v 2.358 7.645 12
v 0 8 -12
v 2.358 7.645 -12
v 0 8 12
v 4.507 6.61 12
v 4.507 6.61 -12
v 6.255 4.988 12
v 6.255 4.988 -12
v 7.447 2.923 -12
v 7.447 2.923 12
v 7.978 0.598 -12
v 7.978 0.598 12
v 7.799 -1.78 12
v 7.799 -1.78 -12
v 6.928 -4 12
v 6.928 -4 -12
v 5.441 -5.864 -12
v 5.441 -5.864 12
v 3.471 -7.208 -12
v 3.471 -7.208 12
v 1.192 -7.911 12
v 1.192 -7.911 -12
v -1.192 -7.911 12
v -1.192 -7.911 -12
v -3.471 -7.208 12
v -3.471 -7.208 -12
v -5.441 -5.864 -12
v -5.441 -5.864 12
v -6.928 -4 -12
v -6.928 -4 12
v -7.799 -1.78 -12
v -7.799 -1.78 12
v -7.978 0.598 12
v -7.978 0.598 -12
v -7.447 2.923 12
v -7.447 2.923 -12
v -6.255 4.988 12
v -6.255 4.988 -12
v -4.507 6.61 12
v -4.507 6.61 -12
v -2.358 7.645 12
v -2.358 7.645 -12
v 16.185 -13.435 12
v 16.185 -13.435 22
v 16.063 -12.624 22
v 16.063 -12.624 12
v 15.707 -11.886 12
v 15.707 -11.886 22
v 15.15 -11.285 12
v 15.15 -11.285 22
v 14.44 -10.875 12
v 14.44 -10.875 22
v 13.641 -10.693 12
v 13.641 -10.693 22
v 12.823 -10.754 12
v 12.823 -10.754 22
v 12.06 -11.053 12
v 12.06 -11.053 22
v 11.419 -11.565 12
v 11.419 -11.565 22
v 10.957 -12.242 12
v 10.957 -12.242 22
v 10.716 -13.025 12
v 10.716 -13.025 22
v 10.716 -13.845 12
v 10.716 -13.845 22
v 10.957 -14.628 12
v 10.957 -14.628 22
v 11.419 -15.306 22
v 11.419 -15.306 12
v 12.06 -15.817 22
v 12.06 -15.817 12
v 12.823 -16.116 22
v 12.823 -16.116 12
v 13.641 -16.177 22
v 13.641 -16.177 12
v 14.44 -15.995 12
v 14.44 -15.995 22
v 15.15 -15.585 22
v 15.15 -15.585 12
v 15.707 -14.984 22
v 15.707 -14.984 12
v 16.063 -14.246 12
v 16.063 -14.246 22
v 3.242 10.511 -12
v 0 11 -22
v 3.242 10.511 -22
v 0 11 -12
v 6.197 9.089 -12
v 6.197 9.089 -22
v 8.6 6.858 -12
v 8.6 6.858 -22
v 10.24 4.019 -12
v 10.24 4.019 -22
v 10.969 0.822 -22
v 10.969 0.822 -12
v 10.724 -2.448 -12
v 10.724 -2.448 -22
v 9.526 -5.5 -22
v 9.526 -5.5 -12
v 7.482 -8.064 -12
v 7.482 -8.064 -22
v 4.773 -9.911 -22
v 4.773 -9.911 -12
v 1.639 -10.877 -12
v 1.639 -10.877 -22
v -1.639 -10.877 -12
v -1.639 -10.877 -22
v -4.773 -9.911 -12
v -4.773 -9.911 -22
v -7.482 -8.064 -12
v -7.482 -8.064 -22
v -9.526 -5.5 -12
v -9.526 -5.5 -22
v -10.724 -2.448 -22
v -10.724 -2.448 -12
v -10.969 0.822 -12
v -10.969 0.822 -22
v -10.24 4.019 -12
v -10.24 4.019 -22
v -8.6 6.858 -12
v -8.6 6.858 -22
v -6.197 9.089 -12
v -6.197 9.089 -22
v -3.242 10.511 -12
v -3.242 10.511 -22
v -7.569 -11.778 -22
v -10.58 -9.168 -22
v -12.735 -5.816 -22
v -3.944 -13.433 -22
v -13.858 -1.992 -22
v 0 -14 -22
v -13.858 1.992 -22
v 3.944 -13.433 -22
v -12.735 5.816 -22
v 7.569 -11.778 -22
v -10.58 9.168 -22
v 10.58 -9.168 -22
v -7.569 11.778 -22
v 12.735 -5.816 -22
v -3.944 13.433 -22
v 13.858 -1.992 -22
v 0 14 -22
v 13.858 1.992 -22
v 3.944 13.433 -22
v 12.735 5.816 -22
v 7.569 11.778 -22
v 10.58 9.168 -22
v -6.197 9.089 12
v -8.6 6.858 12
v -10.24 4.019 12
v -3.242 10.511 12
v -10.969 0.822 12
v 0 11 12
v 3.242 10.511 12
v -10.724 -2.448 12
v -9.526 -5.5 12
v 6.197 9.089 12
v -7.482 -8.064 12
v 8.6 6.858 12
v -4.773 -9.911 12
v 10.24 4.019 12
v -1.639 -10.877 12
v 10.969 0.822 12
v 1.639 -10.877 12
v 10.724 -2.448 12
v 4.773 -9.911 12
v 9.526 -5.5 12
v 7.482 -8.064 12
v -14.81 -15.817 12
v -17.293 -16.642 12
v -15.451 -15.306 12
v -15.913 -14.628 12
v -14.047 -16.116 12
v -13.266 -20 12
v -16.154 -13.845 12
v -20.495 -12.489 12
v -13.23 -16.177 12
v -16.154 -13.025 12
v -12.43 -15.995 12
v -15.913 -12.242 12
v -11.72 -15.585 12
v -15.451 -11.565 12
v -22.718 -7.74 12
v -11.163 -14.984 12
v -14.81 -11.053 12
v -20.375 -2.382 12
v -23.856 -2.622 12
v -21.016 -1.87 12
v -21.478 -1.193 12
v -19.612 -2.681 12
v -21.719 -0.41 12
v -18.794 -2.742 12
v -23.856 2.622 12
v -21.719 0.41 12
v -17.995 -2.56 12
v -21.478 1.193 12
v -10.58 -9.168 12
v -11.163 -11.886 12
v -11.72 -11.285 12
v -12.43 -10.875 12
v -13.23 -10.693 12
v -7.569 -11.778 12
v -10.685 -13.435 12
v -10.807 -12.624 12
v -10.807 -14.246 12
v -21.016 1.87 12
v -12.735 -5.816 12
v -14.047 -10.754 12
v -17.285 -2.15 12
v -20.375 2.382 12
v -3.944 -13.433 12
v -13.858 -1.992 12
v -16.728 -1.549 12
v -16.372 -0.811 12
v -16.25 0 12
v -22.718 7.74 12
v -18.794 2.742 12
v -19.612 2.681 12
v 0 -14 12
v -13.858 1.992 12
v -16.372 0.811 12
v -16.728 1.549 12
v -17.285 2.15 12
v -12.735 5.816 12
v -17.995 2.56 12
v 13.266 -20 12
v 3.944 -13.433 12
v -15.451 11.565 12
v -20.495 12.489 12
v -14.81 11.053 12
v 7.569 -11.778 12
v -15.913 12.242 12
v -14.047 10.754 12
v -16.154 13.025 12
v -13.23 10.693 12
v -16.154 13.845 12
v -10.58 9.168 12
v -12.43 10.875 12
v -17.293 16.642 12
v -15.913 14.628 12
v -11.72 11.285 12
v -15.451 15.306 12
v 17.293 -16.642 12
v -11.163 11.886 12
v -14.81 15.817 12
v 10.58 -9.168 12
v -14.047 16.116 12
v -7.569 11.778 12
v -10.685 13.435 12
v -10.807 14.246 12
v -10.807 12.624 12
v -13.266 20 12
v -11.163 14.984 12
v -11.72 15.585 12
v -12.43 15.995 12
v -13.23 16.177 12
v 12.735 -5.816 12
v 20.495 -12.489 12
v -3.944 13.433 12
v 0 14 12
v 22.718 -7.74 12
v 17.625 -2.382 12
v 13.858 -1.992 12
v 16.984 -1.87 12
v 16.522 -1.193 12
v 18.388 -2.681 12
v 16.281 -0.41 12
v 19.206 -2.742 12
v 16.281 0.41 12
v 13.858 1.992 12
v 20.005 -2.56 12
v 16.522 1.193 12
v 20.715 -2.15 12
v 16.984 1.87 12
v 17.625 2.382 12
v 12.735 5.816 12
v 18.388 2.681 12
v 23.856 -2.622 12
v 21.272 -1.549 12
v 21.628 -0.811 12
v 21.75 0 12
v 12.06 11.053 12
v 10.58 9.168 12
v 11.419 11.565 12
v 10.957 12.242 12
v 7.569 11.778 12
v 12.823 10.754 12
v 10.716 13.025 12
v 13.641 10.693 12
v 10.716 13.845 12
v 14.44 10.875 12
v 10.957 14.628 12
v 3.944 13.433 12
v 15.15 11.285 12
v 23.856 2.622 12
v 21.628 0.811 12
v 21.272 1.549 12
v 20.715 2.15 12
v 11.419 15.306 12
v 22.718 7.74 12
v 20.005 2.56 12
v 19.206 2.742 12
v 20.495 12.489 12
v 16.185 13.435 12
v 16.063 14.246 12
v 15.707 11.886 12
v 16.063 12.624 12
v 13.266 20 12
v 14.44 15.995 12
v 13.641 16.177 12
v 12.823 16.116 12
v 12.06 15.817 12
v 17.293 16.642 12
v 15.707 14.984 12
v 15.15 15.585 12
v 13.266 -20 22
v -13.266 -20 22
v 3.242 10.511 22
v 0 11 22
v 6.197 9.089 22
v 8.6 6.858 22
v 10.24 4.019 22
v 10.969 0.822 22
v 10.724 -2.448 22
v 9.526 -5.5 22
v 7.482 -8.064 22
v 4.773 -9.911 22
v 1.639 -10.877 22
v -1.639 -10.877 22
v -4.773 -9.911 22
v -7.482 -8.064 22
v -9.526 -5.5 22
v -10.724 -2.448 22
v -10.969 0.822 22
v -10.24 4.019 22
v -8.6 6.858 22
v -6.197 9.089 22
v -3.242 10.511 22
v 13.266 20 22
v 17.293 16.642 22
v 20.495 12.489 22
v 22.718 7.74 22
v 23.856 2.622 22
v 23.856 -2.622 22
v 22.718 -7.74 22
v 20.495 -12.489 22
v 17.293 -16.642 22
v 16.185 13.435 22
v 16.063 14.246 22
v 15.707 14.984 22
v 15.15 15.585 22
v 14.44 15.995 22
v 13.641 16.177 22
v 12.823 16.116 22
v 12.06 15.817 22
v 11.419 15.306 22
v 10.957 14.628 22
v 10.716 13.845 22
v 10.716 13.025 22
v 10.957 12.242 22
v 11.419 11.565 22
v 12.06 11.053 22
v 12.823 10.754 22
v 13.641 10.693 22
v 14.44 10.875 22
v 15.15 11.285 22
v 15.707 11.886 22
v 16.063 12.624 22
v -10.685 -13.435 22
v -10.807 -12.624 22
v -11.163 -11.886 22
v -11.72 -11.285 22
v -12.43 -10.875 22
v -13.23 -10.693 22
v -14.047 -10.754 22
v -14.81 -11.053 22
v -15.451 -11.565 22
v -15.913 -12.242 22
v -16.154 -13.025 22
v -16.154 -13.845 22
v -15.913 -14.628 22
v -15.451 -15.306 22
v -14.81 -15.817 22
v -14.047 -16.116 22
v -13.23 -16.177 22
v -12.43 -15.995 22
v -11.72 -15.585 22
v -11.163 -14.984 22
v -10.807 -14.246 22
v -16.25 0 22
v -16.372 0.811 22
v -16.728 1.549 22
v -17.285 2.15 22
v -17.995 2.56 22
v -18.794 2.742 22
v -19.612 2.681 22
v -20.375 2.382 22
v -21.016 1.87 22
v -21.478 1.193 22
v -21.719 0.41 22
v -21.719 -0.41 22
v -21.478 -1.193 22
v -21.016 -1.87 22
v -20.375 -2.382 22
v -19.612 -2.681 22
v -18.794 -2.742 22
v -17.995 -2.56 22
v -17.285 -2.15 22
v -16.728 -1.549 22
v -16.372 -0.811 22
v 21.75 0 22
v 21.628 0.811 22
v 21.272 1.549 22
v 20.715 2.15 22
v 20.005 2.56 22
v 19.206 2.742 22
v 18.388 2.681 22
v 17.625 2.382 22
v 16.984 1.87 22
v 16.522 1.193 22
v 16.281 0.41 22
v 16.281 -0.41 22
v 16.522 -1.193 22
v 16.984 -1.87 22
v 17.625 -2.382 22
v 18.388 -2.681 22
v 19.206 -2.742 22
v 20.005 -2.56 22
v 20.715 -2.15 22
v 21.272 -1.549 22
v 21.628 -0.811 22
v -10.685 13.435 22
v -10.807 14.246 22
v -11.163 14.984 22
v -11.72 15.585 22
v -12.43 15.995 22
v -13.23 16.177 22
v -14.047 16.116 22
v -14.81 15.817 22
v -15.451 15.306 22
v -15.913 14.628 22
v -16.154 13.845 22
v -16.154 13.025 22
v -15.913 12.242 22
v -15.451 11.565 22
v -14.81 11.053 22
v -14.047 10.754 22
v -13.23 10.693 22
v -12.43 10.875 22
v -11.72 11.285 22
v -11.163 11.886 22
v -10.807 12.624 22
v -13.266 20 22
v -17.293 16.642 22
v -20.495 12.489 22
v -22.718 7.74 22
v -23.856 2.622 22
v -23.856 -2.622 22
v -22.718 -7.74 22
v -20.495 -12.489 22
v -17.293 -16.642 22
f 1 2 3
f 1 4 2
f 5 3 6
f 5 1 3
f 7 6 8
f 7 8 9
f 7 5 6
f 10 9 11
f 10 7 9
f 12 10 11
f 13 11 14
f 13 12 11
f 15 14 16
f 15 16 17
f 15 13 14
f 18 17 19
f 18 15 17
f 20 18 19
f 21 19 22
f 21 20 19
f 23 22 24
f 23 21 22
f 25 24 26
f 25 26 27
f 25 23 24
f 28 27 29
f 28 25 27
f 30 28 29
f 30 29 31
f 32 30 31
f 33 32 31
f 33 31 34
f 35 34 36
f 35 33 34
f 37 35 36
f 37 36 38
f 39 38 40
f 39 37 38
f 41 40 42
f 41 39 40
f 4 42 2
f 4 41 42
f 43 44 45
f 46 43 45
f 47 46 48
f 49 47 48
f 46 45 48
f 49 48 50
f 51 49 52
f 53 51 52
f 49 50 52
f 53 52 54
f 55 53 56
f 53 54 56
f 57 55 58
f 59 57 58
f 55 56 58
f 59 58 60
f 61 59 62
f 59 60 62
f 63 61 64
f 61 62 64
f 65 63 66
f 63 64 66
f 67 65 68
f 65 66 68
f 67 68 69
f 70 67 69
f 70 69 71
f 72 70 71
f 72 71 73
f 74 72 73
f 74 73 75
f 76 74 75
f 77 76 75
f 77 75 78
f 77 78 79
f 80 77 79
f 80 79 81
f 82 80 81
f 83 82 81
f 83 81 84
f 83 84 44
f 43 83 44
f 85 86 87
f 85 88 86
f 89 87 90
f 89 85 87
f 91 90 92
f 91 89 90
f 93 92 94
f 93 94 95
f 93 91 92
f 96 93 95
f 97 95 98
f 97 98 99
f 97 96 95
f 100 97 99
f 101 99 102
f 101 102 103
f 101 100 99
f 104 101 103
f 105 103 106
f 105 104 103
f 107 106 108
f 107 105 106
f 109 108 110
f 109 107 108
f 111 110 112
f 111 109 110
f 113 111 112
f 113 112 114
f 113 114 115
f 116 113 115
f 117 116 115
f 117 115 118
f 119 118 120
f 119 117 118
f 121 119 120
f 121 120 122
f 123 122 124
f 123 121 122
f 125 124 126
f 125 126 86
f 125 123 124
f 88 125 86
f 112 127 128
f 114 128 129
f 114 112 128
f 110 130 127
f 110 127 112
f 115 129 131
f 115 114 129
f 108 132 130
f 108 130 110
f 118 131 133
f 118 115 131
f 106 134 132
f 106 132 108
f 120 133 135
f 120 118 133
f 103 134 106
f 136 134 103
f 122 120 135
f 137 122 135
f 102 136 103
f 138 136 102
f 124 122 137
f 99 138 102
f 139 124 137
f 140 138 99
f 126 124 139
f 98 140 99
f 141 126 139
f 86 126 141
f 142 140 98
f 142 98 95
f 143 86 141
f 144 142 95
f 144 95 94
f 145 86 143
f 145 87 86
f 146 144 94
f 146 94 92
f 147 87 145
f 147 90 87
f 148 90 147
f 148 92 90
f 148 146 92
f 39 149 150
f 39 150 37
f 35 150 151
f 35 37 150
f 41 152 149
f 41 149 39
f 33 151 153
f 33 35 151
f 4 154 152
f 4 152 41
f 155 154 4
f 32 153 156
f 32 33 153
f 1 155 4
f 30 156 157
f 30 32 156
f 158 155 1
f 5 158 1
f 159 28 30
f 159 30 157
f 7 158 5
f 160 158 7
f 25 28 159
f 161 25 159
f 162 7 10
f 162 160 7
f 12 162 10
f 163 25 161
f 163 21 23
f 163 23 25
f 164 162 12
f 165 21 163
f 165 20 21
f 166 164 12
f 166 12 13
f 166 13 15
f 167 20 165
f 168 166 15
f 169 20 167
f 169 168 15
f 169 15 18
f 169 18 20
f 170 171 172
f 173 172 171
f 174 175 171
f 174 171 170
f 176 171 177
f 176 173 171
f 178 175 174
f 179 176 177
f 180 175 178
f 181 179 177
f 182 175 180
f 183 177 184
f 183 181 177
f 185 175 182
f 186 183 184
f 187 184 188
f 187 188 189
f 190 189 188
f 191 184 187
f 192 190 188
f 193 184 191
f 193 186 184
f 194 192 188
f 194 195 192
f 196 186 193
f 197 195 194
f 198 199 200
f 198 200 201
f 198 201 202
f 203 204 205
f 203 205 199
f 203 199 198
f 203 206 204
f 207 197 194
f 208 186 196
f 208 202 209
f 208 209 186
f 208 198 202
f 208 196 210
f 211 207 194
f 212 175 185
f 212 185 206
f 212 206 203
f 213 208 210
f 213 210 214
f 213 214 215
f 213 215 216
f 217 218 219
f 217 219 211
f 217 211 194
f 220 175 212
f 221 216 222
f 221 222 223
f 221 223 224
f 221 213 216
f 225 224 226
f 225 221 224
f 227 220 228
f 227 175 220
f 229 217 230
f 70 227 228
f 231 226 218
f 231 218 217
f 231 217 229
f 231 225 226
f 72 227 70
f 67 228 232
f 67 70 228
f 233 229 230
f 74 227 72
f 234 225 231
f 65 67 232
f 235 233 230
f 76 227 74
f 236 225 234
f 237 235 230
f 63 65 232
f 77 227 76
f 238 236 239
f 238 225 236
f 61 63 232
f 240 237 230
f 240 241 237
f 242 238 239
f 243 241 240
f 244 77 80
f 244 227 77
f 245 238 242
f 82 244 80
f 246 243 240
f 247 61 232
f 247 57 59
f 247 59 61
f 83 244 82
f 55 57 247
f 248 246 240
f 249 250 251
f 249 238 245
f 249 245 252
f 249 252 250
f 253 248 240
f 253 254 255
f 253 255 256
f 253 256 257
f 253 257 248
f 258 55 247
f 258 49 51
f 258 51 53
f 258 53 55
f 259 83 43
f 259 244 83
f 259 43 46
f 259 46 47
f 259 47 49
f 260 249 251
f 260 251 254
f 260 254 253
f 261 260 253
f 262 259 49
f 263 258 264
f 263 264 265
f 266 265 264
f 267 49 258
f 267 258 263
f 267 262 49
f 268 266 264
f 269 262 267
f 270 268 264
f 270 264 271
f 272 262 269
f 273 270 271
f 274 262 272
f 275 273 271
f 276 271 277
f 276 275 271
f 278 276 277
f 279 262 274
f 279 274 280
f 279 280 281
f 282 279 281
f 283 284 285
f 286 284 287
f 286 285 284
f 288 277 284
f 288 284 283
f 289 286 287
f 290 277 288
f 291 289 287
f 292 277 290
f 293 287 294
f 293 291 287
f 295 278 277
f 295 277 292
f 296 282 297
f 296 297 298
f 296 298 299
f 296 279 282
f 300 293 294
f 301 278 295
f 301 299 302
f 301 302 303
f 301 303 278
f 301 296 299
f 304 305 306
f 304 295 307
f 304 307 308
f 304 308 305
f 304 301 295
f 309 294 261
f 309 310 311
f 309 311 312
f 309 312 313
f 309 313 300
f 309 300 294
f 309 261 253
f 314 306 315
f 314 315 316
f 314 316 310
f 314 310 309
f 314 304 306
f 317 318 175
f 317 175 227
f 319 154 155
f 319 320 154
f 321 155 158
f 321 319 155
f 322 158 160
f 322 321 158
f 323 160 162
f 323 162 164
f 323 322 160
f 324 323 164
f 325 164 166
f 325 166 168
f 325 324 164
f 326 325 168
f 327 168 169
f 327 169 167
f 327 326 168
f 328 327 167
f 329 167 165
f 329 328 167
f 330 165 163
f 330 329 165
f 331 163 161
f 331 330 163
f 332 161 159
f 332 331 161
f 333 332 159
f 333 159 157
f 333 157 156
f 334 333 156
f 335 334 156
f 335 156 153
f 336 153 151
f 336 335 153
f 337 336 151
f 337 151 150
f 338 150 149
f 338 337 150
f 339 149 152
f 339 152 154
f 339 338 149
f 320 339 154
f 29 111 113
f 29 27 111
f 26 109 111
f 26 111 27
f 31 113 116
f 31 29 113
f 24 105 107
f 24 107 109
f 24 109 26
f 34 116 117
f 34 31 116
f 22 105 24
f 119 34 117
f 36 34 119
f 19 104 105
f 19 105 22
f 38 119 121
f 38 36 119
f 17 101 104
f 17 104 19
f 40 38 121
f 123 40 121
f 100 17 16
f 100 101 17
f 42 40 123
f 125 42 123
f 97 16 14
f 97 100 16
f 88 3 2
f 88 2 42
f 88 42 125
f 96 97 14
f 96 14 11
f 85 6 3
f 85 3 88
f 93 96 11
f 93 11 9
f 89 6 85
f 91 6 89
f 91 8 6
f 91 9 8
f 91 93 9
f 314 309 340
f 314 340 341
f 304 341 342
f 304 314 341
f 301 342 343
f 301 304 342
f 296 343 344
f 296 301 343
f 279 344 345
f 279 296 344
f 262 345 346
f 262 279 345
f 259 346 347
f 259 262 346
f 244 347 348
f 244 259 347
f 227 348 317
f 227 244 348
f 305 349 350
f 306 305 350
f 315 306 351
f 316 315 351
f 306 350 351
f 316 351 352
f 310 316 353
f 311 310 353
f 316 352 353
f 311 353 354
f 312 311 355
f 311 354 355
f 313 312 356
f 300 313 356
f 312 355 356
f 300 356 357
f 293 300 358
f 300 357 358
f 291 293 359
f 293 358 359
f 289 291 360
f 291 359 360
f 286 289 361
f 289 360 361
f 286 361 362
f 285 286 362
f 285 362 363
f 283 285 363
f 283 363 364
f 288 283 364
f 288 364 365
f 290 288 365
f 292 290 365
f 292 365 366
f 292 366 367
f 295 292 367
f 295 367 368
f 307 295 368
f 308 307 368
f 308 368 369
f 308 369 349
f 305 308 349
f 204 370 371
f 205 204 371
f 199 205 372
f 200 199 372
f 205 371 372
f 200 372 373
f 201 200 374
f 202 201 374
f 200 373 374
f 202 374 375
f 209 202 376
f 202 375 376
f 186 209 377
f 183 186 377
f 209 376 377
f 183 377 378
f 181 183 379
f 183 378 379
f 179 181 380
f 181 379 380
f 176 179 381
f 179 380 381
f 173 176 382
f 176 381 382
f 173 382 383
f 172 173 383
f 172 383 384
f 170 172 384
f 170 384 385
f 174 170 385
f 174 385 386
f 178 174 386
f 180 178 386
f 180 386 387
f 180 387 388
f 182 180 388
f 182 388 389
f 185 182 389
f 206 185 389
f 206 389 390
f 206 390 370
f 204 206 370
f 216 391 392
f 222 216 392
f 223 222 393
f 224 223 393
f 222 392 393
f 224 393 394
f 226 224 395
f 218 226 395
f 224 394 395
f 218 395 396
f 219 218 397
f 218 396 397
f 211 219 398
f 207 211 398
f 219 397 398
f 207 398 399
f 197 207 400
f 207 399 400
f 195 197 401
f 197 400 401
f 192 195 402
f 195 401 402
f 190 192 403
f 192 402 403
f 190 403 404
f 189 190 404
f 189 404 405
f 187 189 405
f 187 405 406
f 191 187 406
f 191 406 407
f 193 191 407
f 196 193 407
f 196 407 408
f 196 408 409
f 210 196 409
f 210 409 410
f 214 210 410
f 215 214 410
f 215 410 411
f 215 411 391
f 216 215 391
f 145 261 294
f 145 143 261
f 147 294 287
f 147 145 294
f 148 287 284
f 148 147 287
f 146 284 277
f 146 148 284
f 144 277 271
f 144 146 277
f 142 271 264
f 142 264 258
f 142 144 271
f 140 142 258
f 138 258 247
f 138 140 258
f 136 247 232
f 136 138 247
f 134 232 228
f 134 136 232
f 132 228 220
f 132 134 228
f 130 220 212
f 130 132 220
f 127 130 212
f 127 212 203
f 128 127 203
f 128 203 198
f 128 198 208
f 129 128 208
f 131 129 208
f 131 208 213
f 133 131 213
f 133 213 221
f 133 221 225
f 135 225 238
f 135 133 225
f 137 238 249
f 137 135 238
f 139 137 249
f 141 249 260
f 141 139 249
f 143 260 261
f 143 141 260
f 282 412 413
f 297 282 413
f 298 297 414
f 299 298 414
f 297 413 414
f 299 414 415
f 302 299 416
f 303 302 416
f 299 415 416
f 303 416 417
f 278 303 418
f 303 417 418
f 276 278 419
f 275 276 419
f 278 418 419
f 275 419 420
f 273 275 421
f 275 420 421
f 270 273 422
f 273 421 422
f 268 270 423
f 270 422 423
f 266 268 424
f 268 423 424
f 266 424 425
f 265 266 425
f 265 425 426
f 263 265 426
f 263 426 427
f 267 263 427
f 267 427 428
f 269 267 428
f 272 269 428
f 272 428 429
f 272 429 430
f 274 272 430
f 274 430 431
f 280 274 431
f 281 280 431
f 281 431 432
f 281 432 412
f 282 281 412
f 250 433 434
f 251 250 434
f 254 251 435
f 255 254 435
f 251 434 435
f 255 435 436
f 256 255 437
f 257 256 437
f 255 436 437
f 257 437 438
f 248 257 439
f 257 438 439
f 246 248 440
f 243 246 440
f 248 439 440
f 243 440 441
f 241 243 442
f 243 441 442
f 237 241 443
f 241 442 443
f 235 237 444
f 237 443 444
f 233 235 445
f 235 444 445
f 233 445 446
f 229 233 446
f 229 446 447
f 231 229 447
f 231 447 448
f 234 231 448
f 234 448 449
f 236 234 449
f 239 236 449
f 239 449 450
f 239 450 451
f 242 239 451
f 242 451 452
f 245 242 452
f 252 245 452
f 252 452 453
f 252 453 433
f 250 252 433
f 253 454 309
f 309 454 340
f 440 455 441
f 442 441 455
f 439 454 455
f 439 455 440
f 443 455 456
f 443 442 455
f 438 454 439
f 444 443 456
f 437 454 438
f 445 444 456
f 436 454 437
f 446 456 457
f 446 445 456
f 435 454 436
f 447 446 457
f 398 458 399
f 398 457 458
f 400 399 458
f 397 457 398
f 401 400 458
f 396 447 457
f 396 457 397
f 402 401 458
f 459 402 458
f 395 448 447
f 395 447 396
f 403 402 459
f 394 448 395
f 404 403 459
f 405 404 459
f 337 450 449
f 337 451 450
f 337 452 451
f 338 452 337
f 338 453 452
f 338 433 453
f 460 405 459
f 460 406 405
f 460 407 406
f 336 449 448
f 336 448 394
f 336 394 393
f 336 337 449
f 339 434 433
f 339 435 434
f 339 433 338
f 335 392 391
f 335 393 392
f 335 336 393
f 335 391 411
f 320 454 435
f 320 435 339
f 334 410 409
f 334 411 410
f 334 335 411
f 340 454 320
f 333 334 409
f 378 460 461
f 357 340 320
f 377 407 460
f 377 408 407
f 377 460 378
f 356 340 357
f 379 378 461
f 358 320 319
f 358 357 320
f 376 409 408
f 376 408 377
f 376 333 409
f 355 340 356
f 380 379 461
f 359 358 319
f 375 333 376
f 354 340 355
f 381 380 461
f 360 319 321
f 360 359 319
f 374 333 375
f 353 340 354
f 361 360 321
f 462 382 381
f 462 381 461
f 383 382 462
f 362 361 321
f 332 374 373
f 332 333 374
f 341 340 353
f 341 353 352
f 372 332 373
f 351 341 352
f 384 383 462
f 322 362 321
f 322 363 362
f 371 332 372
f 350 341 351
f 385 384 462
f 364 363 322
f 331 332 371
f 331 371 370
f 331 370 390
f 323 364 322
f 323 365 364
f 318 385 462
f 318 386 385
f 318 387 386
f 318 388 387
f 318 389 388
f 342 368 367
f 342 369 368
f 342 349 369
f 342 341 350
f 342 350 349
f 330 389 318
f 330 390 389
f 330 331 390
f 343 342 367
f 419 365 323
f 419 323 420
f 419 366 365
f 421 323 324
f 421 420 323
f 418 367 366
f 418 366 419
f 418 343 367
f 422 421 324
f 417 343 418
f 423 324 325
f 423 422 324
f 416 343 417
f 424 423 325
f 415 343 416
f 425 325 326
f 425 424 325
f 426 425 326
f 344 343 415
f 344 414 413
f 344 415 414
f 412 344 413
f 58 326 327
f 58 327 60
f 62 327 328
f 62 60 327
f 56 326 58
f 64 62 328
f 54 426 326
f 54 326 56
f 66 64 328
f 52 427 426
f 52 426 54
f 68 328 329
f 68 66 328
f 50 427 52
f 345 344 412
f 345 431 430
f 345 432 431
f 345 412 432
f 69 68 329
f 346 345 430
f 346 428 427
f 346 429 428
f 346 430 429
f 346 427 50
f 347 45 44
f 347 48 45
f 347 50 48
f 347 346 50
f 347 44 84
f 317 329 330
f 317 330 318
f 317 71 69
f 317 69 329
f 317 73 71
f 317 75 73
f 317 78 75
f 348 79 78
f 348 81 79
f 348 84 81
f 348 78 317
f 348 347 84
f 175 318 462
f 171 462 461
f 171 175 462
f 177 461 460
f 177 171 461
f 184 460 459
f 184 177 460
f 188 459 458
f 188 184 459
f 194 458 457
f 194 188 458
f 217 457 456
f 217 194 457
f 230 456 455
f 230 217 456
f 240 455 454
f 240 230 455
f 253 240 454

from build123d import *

# Parameters (mm, degrees)
SKETCH5_W          = 40
SKETCH5_H          = 10
CUT_EXTRUDE3_DEPTH = 45
SKETCH6_R          = 2.75
CUT_EXTRUDE4_DEPTH = 45


with BuildPart() as part:
    # Sketch4 → Revolve2 (revolve)
    with BuildSketch(Plane(origin=(0, 0, 0), x_dir=(0, 0, -1), z_dir=(1, 0, 0))):
        Polygon((22, 11), (12, 11), (12, 8), (-12, 8), (-12, 11), (-22, 11), (-22, 24), (-12, 24), (-12, 14), (22, 14), align=None)
    revolve(axis=Axis((0, 0, 17.928277082), (0, 0, -1)))

    # Sketch5 → Cut-Extrude3 (cut, through all)
    with BuildSketch(Plane.XY.offset(22)):
        with Locations((0, 25)):
            Rectangle(SKETCH5_W, SKETCH5_H)
        with Locations((0, -25)):
            Rectangle(SKETCH5_W, SKETCH5_H)
    extrude(amount=-CUT_EXTRUDE3_DEPTH, mode=Mode.SUBTRACT)

    # Sketch6 → Cut-Extrude4 (cut, through all)
    with BuildSketch(Plane.XY.offset(22)):
        with Locations((-19, 0)):
            Circle(SKETCH6_R)
        with Locations((-13.435028843, 13.435028843)):
            Circle(SKETCH6_R)
        with Locations((13.435028843, 13.435028843)):
            Circle(SKETCH6_R)
        with Locations((19, 0)):
            Circle(SKETCH6_R)
        with Locations((13.435028843, -13.435028843)):
            Circle(SKETCH6_R)
        with Locations((-13.435028843, -13.435028843)):
            Circle(SKETCH6_R)
    extrude(amount=-CUT_EXTRUDE4_DEPTH, mode=Mode.SUBTRACT)


solid = part.part
